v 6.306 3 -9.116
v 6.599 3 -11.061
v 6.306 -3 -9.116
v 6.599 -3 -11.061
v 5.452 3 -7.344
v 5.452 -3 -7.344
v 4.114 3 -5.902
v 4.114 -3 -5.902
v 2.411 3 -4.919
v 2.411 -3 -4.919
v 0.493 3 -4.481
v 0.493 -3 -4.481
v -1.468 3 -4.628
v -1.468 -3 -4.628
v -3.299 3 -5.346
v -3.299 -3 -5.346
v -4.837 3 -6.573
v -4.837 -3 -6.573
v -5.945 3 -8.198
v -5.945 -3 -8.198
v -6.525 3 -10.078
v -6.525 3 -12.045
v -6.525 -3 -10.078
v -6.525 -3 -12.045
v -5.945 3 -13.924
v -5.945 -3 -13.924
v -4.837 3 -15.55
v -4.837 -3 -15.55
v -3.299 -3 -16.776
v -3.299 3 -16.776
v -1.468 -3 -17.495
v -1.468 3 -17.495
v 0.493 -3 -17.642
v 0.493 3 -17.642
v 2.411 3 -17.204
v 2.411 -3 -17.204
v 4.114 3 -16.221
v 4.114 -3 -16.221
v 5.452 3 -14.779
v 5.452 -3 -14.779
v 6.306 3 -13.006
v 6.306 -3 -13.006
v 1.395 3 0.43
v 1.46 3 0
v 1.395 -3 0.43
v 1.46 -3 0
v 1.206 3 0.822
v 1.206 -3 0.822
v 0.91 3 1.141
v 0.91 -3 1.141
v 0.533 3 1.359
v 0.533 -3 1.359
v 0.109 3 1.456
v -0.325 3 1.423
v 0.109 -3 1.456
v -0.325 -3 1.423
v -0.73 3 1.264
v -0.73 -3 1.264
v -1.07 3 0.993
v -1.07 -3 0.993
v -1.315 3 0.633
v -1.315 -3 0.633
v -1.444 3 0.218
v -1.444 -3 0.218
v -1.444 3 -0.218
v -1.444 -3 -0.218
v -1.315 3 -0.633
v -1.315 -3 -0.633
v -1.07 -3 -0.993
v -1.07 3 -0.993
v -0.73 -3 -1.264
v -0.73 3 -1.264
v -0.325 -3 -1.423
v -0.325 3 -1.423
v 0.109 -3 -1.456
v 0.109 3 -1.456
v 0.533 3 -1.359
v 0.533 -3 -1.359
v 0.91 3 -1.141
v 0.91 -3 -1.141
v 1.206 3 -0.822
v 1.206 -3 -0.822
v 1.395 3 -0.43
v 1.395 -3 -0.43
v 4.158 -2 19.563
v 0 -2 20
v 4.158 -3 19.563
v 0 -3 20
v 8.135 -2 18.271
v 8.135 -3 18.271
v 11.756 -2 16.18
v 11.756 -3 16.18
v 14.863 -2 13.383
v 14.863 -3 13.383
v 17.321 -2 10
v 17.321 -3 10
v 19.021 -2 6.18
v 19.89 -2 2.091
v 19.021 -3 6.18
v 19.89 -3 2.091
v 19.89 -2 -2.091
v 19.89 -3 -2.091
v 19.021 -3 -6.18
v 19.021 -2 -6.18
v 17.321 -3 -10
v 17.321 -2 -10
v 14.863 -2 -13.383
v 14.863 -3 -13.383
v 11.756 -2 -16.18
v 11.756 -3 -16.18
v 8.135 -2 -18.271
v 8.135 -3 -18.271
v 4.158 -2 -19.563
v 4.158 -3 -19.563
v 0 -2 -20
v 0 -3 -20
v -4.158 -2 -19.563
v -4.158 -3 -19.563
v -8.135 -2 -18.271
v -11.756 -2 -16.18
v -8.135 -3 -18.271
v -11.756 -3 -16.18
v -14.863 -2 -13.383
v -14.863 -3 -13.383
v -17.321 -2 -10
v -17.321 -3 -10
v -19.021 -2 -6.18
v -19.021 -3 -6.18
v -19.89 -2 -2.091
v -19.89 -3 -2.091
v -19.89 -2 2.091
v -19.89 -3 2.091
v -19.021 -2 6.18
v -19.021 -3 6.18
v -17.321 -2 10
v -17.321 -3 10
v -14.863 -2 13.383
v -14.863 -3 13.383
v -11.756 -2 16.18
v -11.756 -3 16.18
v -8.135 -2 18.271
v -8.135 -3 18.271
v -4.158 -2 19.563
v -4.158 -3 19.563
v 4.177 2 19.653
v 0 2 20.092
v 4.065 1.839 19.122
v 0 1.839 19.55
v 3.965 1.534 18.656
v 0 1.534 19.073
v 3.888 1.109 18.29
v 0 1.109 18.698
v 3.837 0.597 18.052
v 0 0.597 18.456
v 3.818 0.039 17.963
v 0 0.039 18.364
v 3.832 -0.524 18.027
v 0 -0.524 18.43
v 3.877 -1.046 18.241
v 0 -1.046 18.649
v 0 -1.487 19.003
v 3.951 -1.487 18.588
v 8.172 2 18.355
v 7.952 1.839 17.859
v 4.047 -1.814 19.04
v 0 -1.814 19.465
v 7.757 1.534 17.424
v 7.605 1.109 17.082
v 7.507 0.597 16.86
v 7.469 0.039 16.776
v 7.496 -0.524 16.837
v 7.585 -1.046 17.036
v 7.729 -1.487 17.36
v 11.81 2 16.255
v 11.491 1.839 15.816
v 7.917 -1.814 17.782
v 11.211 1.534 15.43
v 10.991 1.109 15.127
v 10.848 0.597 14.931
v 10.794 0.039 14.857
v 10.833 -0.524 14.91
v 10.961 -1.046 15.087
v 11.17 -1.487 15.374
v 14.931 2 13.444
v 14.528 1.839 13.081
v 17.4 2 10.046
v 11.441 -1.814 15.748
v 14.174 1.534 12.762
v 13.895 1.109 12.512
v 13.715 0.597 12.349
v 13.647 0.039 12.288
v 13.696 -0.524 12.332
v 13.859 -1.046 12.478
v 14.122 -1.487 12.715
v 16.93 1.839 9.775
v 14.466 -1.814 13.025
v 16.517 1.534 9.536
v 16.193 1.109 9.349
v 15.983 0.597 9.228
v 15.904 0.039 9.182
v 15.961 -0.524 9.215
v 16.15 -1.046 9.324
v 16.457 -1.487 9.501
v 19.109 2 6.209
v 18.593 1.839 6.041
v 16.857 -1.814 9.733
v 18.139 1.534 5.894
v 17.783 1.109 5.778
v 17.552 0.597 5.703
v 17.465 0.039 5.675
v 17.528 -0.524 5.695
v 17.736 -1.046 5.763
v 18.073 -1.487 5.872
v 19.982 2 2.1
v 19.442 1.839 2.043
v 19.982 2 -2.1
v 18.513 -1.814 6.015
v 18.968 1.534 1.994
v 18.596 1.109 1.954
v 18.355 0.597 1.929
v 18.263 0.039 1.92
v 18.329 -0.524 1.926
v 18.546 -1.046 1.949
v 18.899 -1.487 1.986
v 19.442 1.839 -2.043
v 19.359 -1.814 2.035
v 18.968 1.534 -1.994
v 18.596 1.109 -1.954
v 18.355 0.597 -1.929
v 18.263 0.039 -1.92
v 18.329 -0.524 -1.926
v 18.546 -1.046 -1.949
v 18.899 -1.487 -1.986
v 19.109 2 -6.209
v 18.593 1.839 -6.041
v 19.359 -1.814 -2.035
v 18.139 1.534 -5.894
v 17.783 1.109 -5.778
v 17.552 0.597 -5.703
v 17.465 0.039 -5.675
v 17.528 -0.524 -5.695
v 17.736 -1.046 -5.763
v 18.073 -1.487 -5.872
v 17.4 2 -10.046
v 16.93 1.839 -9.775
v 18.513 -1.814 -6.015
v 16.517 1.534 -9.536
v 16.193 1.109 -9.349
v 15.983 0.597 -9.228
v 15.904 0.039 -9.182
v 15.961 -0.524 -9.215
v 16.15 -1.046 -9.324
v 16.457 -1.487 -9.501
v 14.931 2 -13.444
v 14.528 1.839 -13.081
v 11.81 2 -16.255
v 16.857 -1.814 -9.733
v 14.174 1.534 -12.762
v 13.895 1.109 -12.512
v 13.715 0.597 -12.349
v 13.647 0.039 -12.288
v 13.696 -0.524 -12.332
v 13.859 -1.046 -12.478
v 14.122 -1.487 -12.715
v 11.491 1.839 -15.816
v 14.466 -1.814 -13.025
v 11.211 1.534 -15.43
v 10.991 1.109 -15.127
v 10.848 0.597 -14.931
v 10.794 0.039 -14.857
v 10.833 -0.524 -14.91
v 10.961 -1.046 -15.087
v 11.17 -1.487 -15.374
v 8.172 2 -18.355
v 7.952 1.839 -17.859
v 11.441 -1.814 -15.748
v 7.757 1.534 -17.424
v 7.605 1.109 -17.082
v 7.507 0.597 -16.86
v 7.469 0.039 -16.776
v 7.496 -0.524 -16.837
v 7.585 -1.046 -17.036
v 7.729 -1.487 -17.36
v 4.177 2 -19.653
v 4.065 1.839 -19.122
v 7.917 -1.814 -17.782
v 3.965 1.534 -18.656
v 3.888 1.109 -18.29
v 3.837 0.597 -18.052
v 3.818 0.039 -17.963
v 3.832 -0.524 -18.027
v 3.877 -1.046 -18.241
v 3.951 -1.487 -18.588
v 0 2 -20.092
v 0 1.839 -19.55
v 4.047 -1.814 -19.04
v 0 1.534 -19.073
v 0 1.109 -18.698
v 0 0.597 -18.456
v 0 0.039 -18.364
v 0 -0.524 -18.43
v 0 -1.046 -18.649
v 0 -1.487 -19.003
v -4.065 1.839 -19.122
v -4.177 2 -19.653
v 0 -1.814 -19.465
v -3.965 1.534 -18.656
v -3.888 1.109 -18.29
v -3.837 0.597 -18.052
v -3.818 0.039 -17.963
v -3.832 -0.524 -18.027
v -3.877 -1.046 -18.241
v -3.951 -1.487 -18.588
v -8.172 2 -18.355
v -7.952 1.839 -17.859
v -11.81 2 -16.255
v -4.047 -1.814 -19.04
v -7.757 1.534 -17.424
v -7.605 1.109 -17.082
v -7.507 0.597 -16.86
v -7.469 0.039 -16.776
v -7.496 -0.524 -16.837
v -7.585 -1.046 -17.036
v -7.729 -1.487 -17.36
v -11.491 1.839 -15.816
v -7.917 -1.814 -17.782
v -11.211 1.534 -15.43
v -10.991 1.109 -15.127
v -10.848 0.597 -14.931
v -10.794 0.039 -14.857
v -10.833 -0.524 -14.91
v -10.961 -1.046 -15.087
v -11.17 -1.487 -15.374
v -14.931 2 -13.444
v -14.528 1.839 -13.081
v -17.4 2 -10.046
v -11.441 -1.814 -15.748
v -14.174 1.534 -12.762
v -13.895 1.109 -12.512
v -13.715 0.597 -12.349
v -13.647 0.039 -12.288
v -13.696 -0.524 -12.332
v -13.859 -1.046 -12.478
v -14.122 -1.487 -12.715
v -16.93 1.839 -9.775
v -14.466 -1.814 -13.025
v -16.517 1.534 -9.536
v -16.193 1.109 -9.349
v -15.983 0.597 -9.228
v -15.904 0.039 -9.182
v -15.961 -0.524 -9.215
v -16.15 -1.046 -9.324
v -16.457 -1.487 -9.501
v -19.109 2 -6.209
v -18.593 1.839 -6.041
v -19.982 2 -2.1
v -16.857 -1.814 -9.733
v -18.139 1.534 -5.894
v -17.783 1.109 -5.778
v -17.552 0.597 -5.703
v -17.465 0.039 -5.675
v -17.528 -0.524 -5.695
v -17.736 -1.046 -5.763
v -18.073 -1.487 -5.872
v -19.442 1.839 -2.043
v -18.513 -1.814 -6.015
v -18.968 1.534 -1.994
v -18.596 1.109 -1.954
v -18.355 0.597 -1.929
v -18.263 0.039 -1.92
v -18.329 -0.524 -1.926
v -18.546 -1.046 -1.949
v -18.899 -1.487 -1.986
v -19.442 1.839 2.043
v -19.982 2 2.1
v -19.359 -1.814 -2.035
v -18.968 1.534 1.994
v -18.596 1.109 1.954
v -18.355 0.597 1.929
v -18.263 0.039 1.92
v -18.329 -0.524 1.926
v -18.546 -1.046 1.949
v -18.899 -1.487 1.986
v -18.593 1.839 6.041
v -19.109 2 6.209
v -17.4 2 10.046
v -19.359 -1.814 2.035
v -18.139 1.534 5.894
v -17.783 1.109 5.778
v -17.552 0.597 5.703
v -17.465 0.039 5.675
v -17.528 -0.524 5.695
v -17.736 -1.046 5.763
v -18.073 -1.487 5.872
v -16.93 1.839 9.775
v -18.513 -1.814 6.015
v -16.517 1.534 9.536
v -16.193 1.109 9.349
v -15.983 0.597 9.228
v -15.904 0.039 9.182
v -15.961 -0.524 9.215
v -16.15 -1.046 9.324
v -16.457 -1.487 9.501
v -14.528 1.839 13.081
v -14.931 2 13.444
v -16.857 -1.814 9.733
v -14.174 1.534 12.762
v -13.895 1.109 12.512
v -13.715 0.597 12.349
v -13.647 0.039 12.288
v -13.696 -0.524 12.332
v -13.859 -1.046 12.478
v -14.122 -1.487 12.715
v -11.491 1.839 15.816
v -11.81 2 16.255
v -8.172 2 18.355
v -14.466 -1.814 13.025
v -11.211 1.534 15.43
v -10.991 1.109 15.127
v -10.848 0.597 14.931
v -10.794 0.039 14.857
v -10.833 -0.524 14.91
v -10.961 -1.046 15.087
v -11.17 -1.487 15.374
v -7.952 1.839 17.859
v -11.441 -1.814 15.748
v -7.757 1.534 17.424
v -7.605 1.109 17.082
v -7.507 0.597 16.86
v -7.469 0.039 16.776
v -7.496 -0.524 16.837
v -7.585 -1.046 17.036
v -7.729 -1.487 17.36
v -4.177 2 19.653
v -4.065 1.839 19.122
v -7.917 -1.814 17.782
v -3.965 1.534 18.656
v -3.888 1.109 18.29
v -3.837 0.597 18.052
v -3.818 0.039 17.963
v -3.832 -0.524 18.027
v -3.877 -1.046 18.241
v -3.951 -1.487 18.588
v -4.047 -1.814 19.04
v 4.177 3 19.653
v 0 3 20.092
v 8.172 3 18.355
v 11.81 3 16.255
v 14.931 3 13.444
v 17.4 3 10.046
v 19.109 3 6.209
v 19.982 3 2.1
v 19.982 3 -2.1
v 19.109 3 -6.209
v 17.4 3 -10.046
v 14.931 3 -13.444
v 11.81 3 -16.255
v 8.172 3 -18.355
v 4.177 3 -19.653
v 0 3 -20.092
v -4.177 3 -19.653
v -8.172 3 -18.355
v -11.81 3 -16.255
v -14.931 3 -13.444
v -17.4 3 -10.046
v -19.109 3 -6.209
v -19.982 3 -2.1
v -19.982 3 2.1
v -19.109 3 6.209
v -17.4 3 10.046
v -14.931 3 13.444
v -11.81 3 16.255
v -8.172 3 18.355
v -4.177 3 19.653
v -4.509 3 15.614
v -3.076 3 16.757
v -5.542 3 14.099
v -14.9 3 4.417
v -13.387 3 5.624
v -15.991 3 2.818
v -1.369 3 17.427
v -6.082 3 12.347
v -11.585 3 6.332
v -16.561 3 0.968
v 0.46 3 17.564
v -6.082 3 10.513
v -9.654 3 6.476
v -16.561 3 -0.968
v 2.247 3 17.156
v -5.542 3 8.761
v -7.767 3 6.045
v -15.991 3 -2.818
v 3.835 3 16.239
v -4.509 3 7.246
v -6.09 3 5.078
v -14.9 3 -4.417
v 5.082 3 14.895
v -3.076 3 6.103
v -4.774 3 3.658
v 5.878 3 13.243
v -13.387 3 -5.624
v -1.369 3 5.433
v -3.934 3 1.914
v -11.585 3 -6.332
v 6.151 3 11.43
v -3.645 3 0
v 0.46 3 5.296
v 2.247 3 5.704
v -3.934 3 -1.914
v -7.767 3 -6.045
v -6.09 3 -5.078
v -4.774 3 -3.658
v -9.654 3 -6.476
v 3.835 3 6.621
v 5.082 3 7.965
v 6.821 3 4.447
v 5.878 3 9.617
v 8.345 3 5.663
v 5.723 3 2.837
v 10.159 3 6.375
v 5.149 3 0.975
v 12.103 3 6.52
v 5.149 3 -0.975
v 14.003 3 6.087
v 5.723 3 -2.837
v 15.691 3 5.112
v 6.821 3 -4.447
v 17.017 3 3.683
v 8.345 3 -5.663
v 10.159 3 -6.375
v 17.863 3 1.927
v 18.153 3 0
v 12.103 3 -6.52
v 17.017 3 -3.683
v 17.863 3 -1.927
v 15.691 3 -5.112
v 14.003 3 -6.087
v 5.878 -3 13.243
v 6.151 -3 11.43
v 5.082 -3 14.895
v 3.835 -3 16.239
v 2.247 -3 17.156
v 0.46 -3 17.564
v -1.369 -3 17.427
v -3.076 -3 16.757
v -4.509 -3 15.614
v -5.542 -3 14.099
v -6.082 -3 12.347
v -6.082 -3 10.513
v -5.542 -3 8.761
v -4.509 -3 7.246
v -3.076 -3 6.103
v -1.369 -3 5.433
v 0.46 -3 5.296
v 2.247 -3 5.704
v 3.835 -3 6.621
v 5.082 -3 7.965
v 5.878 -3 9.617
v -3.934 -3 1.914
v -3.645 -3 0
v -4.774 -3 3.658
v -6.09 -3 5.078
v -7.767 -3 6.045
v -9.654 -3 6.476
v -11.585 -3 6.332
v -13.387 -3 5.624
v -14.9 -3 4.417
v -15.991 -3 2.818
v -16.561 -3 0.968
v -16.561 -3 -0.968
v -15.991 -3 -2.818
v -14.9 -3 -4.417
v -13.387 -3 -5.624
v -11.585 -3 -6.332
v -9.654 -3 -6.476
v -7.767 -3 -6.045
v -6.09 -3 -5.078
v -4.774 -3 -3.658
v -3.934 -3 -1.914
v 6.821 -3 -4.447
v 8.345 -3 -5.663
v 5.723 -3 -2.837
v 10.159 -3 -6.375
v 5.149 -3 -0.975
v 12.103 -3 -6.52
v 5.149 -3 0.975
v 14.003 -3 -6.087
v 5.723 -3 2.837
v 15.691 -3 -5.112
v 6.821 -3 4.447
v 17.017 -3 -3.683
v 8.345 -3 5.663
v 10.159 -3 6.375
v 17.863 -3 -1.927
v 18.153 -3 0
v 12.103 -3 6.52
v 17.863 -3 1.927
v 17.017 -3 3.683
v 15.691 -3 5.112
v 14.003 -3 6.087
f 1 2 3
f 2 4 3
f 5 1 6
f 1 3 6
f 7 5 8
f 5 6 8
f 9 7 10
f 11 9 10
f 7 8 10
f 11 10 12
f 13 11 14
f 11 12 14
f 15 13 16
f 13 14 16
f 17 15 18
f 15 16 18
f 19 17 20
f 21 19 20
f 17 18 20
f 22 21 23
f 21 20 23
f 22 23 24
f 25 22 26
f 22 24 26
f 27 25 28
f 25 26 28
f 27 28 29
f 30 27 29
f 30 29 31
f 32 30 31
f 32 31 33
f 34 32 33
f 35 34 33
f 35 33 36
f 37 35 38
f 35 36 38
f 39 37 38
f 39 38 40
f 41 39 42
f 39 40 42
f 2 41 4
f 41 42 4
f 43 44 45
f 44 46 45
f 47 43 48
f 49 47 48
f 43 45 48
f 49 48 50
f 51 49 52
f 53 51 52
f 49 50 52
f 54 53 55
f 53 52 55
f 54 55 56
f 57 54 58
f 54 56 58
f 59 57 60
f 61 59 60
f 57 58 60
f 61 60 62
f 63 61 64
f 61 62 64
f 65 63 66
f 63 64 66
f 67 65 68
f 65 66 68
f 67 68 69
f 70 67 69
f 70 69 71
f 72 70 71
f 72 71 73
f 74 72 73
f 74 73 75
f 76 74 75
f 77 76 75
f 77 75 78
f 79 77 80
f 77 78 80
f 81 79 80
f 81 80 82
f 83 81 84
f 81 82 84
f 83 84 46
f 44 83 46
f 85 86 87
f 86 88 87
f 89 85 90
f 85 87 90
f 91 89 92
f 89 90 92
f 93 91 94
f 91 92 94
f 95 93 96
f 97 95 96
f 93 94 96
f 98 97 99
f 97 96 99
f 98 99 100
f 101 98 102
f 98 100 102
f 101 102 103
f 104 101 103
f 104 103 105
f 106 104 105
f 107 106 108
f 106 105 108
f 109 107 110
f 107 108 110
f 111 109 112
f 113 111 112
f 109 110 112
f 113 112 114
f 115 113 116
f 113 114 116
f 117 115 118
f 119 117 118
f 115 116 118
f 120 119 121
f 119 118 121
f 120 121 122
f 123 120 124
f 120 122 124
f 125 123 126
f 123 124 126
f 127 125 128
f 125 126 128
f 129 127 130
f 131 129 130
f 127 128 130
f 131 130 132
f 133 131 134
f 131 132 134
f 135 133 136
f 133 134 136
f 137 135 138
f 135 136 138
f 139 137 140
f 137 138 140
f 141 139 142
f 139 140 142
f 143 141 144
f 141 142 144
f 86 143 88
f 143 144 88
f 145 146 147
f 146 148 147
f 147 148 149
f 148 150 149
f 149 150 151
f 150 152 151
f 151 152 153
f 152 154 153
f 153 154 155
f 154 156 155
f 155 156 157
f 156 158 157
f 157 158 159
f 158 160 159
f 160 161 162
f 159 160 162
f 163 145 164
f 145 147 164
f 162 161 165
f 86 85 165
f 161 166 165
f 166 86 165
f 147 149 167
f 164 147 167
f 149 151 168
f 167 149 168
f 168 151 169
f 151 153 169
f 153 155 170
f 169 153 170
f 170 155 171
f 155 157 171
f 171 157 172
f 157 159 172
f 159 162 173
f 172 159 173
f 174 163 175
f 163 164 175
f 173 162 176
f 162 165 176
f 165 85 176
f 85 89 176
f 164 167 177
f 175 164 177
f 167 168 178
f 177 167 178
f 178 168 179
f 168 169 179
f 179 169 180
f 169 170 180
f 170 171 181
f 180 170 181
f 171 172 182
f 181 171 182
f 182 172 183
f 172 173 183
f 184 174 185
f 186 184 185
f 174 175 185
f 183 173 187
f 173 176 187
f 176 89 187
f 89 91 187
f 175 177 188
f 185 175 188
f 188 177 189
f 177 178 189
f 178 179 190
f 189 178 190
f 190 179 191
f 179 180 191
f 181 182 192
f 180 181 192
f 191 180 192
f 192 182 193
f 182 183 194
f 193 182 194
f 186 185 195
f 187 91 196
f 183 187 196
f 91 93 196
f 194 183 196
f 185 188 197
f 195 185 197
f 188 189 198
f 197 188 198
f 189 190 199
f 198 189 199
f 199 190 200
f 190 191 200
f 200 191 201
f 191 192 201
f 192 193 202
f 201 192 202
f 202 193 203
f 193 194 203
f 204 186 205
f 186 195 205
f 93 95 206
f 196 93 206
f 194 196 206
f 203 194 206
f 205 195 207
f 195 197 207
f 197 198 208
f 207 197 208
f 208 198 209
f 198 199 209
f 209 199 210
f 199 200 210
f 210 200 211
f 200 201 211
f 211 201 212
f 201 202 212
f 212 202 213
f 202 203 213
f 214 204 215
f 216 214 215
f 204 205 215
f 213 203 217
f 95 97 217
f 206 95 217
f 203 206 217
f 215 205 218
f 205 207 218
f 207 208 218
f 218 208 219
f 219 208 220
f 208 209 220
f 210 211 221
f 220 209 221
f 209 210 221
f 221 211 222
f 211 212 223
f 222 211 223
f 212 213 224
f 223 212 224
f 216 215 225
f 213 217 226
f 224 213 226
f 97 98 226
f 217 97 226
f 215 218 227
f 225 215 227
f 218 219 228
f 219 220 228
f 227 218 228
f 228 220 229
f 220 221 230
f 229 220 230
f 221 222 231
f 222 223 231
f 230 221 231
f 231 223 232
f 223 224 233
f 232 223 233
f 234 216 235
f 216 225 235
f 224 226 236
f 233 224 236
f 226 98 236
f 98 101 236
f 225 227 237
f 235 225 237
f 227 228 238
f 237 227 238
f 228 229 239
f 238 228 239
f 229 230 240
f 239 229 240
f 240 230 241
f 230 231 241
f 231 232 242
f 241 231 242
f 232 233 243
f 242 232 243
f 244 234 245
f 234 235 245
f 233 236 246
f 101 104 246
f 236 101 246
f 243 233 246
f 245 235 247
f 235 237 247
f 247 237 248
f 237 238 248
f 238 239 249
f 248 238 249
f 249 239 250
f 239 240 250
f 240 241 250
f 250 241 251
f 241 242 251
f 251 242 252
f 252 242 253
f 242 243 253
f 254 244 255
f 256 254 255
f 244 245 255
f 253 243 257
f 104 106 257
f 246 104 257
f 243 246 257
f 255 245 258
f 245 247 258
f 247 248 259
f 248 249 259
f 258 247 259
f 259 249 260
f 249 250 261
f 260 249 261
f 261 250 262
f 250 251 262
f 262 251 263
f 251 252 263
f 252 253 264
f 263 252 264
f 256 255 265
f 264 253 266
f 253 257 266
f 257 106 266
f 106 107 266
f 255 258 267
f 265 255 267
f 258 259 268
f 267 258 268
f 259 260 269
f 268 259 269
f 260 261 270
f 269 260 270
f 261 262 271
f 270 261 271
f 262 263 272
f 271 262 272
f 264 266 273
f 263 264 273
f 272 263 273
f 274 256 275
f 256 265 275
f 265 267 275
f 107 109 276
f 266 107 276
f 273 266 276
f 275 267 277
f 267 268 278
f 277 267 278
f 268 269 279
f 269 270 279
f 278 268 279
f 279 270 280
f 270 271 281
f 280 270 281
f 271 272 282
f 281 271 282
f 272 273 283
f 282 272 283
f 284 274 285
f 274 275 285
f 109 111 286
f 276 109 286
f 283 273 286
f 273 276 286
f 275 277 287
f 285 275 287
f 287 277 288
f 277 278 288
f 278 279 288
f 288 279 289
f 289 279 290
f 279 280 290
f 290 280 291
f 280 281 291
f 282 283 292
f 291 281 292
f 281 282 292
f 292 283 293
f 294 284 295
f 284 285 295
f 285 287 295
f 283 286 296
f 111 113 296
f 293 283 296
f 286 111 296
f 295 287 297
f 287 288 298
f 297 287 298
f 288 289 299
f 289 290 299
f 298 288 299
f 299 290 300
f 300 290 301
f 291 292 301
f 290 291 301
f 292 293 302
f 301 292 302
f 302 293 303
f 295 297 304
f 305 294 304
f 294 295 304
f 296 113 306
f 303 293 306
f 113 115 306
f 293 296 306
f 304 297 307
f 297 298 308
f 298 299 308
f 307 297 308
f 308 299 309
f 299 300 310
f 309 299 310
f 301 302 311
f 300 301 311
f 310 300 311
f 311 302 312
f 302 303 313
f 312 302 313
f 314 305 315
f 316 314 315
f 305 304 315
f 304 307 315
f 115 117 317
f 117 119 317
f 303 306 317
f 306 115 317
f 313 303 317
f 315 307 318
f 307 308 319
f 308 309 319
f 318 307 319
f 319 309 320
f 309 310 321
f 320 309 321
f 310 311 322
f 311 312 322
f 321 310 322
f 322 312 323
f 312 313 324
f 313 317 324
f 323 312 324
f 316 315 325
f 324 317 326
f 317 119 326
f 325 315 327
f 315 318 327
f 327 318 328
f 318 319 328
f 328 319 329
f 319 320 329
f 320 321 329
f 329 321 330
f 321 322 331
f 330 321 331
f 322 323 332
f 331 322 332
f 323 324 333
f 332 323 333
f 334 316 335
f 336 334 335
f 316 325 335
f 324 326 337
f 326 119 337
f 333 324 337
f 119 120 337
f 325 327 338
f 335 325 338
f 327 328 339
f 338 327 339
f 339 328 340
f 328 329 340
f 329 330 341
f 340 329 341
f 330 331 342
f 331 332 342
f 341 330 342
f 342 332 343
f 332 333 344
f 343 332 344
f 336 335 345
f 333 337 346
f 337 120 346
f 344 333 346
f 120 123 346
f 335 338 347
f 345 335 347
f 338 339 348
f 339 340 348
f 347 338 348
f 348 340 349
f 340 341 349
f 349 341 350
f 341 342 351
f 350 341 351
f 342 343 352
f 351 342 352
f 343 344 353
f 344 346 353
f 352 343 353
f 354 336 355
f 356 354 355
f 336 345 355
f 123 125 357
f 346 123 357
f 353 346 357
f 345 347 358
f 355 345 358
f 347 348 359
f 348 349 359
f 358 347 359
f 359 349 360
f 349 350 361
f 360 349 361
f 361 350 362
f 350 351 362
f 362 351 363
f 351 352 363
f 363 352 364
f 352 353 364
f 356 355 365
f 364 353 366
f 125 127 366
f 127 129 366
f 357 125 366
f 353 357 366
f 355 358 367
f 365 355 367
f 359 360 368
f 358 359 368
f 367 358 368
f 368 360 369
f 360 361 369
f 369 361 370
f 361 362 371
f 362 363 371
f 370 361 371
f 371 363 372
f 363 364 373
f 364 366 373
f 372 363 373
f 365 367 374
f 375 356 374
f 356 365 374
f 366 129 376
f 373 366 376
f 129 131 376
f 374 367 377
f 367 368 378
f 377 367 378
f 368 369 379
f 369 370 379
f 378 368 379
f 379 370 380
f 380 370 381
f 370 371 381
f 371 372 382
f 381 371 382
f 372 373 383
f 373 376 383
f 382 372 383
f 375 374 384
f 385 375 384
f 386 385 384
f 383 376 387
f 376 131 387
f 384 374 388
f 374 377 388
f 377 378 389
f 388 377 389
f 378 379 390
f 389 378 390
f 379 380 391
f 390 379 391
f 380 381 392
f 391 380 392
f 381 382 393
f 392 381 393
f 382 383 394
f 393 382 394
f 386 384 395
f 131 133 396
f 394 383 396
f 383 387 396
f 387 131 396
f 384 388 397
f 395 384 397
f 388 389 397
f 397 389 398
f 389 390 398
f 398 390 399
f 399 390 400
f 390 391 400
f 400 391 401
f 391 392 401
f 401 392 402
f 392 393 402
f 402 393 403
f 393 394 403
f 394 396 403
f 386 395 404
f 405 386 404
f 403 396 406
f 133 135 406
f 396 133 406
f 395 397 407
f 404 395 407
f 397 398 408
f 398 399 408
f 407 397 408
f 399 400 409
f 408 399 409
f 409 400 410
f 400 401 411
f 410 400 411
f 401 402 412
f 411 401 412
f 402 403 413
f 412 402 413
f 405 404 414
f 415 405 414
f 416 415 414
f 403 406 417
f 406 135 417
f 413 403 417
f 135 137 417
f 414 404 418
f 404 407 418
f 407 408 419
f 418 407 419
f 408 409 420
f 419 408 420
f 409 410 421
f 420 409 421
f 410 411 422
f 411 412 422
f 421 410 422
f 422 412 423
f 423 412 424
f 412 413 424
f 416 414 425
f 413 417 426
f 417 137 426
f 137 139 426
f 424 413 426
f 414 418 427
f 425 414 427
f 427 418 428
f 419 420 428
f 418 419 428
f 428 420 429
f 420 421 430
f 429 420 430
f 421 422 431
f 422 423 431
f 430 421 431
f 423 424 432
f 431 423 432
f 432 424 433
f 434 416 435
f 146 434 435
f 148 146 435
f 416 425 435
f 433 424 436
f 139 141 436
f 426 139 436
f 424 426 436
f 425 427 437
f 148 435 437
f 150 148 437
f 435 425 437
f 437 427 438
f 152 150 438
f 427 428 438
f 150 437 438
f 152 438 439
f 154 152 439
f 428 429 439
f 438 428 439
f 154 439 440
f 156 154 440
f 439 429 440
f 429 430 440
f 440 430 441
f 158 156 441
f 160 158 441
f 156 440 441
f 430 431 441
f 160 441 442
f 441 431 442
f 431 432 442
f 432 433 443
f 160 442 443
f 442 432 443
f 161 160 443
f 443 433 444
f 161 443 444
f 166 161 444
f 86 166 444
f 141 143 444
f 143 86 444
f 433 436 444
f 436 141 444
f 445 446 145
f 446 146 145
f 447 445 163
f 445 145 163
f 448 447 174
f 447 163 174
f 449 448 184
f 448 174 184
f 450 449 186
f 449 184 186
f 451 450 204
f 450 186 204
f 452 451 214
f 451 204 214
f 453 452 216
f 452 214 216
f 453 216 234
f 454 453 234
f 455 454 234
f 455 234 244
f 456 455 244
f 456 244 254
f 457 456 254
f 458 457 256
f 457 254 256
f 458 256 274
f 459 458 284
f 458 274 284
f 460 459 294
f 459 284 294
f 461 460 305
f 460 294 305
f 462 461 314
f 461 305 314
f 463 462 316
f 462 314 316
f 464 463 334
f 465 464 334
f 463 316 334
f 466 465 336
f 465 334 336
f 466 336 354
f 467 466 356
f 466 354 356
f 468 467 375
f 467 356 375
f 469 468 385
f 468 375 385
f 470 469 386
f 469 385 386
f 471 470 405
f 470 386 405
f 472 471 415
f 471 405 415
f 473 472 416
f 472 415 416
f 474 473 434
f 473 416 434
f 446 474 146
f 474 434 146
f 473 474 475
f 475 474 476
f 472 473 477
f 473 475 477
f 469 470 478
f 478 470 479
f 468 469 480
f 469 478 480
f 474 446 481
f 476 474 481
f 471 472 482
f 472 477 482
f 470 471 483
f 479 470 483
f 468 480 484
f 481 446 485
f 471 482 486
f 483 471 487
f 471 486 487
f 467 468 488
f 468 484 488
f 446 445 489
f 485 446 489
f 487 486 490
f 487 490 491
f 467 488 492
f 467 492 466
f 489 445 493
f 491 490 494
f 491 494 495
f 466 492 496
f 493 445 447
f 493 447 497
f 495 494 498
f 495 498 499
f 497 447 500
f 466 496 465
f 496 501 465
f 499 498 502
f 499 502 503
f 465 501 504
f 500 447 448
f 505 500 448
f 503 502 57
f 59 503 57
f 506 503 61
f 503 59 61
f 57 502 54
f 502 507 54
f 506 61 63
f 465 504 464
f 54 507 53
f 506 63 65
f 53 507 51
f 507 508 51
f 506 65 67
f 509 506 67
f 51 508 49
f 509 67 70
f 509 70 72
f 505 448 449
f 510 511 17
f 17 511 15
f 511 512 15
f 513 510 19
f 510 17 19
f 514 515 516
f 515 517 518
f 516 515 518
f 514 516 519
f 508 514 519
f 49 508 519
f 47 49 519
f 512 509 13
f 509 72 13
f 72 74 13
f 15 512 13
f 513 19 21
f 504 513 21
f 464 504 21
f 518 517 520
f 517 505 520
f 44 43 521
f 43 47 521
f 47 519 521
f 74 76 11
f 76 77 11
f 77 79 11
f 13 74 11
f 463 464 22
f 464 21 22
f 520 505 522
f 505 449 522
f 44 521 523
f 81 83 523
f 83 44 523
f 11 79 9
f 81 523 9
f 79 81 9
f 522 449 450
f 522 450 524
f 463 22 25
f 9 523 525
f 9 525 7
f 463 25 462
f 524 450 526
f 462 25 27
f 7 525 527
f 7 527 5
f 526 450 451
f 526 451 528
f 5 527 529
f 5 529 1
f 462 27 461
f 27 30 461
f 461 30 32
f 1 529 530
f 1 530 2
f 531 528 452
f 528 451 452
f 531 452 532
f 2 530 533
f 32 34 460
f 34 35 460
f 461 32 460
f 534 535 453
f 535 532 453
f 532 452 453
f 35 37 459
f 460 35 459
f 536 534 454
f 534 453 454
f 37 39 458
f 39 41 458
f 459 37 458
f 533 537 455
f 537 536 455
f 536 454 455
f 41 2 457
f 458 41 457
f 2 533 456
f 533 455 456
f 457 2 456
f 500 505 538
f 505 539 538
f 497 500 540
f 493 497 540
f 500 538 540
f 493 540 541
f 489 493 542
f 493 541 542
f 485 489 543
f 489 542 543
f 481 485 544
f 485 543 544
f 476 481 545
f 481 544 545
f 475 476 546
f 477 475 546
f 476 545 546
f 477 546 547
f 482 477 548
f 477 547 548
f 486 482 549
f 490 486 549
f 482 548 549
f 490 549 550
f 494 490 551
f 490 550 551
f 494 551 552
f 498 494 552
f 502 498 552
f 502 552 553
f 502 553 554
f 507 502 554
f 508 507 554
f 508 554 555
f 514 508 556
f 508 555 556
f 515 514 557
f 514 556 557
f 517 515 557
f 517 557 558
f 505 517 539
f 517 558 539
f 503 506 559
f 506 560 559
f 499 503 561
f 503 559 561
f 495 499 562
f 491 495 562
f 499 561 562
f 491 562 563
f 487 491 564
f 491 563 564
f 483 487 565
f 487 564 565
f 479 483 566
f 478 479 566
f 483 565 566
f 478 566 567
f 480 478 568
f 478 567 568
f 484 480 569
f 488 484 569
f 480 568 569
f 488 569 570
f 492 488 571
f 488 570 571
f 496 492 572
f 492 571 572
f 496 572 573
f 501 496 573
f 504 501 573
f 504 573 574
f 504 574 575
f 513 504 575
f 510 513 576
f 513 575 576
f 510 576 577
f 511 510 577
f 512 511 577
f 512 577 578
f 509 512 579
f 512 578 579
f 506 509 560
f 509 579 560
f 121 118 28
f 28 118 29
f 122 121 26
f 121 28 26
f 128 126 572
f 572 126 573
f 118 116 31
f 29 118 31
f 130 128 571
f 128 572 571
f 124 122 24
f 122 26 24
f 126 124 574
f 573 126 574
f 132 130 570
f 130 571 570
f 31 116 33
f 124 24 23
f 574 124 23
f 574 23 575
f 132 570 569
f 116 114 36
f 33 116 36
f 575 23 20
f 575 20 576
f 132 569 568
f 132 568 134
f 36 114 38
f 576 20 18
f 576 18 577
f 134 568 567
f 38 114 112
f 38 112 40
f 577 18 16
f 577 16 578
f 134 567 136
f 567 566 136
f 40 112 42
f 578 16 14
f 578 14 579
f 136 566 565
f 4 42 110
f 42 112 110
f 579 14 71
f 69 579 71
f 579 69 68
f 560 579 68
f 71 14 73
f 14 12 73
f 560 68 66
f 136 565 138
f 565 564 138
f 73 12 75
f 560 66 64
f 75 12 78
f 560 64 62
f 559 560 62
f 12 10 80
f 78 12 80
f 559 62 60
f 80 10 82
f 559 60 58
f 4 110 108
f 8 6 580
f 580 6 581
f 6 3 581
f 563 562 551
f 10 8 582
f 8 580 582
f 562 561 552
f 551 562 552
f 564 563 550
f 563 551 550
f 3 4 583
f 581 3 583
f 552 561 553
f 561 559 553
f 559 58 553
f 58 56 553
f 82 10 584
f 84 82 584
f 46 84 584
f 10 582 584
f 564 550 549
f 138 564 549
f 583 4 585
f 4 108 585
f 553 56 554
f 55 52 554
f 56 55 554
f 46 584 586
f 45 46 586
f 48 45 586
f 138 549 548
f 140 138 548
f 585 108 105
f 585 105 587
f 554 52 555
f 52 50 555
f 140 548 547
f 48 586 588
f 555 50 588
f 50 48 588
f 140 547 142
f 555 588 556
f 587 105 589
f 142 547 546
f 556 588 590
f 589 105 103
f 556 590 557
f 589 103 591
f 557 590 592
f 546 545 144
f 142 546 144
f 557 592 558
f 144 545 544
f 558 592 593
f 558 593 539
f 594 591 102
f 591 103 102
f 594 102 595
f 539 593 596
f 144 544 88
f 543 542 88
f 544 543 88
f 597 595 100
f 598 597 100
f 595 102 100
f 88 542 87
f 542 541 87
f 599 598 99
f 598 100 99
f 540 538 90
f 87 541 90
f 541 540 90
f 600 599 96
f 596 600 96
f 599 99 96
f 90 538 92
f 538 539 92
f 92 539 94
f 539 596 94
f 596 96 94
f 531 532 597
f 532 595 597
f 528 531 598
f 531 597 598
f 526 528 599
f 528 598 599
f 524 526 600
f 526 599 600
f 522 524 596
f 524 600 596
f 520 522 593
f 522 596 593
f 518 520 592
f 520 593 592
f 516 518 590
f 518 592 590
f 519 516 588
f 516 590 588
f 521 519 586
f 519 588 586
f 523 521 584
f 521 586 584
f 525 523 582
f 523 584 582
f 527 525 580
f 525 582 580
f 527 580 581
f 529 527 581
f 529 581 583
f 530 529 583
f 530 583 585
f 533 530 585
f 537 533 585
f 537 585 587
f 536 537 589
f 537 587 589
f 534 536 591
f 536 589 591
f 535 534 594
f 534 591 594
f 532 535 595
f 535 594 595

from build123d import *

# Parameters (mm, degrees)
F2_R          = 1.459965
F3_DEPTH      = 23.4188
F3_DEPTH_BACK = 25.4
F5_R          = 6.151073
F5_R_2        = 6.494421
F5_R_3        = 6.5989
F5_R_4        = 6.538752
F6_DEPTH      = 38.608
F6_DEPTH_BACK = 35.814


with BuildPart() as f1:
    # F0 (on Right) → F1 (revolve)
    with BuildSketch(Plane.YZ):
        with BuildLine():
            Line((-3, 20), (-3, 0))
            Line((-3, 0), (3, 0))
            Line((3, 0), (3, 20.092177))
            Line((3, 20.092177), (2, 20.092177))
            ThreePointArc((2, 20.092177), (0.038764, 18.363927), (-2, 20))
            Line((-2, 20), (-3, 20))
        make_face()
    revolve(axis=Axis((0, 0, 0), (0, 1, 0)))


with BuildPart() as f3:
    # F2 (on Front) → F3 (new body, two sides)
    with BuildSketch(Plane.XZ) as f3_sk:
        Circle(F2_R)
    extrude(amount=F3_DEPTH)
    extrude(f3_sk.sketch, amount=-F3_DEPTH_BACK)


with BuildPart() as f1_1:
    add(f1.part)

    # F4: cut F3
    add(f3.part, mode=Mode.SUBTRACT)


with BuildPart() as f6:
    # F5 (on Front) → F6 (new body, two sides)
    with BuildSketch(Plane.XZ) as f6_sk:
        with Locations((0, 11.43)):
            Circle(F5_R)
        with Locations((-10.139517, 0)):
            Circle(F5_R_2)
        with Locations((0, -11.06129)):
            Circle(F5_R_3)
        with Locations((11.614354, 0)):
            Circle(F5_R_4)
    extrude(amount=F6_DEPTH)
    extrude(f6_sk.sketch, amount=-F6_DEPTH_BACK)


with BuildPart() as f1_2:
    add(f1_1.part)

    # F7: cut F6
    add(f6.part, mode=Mode.SUBTRACT)


solid = f1_2.part
